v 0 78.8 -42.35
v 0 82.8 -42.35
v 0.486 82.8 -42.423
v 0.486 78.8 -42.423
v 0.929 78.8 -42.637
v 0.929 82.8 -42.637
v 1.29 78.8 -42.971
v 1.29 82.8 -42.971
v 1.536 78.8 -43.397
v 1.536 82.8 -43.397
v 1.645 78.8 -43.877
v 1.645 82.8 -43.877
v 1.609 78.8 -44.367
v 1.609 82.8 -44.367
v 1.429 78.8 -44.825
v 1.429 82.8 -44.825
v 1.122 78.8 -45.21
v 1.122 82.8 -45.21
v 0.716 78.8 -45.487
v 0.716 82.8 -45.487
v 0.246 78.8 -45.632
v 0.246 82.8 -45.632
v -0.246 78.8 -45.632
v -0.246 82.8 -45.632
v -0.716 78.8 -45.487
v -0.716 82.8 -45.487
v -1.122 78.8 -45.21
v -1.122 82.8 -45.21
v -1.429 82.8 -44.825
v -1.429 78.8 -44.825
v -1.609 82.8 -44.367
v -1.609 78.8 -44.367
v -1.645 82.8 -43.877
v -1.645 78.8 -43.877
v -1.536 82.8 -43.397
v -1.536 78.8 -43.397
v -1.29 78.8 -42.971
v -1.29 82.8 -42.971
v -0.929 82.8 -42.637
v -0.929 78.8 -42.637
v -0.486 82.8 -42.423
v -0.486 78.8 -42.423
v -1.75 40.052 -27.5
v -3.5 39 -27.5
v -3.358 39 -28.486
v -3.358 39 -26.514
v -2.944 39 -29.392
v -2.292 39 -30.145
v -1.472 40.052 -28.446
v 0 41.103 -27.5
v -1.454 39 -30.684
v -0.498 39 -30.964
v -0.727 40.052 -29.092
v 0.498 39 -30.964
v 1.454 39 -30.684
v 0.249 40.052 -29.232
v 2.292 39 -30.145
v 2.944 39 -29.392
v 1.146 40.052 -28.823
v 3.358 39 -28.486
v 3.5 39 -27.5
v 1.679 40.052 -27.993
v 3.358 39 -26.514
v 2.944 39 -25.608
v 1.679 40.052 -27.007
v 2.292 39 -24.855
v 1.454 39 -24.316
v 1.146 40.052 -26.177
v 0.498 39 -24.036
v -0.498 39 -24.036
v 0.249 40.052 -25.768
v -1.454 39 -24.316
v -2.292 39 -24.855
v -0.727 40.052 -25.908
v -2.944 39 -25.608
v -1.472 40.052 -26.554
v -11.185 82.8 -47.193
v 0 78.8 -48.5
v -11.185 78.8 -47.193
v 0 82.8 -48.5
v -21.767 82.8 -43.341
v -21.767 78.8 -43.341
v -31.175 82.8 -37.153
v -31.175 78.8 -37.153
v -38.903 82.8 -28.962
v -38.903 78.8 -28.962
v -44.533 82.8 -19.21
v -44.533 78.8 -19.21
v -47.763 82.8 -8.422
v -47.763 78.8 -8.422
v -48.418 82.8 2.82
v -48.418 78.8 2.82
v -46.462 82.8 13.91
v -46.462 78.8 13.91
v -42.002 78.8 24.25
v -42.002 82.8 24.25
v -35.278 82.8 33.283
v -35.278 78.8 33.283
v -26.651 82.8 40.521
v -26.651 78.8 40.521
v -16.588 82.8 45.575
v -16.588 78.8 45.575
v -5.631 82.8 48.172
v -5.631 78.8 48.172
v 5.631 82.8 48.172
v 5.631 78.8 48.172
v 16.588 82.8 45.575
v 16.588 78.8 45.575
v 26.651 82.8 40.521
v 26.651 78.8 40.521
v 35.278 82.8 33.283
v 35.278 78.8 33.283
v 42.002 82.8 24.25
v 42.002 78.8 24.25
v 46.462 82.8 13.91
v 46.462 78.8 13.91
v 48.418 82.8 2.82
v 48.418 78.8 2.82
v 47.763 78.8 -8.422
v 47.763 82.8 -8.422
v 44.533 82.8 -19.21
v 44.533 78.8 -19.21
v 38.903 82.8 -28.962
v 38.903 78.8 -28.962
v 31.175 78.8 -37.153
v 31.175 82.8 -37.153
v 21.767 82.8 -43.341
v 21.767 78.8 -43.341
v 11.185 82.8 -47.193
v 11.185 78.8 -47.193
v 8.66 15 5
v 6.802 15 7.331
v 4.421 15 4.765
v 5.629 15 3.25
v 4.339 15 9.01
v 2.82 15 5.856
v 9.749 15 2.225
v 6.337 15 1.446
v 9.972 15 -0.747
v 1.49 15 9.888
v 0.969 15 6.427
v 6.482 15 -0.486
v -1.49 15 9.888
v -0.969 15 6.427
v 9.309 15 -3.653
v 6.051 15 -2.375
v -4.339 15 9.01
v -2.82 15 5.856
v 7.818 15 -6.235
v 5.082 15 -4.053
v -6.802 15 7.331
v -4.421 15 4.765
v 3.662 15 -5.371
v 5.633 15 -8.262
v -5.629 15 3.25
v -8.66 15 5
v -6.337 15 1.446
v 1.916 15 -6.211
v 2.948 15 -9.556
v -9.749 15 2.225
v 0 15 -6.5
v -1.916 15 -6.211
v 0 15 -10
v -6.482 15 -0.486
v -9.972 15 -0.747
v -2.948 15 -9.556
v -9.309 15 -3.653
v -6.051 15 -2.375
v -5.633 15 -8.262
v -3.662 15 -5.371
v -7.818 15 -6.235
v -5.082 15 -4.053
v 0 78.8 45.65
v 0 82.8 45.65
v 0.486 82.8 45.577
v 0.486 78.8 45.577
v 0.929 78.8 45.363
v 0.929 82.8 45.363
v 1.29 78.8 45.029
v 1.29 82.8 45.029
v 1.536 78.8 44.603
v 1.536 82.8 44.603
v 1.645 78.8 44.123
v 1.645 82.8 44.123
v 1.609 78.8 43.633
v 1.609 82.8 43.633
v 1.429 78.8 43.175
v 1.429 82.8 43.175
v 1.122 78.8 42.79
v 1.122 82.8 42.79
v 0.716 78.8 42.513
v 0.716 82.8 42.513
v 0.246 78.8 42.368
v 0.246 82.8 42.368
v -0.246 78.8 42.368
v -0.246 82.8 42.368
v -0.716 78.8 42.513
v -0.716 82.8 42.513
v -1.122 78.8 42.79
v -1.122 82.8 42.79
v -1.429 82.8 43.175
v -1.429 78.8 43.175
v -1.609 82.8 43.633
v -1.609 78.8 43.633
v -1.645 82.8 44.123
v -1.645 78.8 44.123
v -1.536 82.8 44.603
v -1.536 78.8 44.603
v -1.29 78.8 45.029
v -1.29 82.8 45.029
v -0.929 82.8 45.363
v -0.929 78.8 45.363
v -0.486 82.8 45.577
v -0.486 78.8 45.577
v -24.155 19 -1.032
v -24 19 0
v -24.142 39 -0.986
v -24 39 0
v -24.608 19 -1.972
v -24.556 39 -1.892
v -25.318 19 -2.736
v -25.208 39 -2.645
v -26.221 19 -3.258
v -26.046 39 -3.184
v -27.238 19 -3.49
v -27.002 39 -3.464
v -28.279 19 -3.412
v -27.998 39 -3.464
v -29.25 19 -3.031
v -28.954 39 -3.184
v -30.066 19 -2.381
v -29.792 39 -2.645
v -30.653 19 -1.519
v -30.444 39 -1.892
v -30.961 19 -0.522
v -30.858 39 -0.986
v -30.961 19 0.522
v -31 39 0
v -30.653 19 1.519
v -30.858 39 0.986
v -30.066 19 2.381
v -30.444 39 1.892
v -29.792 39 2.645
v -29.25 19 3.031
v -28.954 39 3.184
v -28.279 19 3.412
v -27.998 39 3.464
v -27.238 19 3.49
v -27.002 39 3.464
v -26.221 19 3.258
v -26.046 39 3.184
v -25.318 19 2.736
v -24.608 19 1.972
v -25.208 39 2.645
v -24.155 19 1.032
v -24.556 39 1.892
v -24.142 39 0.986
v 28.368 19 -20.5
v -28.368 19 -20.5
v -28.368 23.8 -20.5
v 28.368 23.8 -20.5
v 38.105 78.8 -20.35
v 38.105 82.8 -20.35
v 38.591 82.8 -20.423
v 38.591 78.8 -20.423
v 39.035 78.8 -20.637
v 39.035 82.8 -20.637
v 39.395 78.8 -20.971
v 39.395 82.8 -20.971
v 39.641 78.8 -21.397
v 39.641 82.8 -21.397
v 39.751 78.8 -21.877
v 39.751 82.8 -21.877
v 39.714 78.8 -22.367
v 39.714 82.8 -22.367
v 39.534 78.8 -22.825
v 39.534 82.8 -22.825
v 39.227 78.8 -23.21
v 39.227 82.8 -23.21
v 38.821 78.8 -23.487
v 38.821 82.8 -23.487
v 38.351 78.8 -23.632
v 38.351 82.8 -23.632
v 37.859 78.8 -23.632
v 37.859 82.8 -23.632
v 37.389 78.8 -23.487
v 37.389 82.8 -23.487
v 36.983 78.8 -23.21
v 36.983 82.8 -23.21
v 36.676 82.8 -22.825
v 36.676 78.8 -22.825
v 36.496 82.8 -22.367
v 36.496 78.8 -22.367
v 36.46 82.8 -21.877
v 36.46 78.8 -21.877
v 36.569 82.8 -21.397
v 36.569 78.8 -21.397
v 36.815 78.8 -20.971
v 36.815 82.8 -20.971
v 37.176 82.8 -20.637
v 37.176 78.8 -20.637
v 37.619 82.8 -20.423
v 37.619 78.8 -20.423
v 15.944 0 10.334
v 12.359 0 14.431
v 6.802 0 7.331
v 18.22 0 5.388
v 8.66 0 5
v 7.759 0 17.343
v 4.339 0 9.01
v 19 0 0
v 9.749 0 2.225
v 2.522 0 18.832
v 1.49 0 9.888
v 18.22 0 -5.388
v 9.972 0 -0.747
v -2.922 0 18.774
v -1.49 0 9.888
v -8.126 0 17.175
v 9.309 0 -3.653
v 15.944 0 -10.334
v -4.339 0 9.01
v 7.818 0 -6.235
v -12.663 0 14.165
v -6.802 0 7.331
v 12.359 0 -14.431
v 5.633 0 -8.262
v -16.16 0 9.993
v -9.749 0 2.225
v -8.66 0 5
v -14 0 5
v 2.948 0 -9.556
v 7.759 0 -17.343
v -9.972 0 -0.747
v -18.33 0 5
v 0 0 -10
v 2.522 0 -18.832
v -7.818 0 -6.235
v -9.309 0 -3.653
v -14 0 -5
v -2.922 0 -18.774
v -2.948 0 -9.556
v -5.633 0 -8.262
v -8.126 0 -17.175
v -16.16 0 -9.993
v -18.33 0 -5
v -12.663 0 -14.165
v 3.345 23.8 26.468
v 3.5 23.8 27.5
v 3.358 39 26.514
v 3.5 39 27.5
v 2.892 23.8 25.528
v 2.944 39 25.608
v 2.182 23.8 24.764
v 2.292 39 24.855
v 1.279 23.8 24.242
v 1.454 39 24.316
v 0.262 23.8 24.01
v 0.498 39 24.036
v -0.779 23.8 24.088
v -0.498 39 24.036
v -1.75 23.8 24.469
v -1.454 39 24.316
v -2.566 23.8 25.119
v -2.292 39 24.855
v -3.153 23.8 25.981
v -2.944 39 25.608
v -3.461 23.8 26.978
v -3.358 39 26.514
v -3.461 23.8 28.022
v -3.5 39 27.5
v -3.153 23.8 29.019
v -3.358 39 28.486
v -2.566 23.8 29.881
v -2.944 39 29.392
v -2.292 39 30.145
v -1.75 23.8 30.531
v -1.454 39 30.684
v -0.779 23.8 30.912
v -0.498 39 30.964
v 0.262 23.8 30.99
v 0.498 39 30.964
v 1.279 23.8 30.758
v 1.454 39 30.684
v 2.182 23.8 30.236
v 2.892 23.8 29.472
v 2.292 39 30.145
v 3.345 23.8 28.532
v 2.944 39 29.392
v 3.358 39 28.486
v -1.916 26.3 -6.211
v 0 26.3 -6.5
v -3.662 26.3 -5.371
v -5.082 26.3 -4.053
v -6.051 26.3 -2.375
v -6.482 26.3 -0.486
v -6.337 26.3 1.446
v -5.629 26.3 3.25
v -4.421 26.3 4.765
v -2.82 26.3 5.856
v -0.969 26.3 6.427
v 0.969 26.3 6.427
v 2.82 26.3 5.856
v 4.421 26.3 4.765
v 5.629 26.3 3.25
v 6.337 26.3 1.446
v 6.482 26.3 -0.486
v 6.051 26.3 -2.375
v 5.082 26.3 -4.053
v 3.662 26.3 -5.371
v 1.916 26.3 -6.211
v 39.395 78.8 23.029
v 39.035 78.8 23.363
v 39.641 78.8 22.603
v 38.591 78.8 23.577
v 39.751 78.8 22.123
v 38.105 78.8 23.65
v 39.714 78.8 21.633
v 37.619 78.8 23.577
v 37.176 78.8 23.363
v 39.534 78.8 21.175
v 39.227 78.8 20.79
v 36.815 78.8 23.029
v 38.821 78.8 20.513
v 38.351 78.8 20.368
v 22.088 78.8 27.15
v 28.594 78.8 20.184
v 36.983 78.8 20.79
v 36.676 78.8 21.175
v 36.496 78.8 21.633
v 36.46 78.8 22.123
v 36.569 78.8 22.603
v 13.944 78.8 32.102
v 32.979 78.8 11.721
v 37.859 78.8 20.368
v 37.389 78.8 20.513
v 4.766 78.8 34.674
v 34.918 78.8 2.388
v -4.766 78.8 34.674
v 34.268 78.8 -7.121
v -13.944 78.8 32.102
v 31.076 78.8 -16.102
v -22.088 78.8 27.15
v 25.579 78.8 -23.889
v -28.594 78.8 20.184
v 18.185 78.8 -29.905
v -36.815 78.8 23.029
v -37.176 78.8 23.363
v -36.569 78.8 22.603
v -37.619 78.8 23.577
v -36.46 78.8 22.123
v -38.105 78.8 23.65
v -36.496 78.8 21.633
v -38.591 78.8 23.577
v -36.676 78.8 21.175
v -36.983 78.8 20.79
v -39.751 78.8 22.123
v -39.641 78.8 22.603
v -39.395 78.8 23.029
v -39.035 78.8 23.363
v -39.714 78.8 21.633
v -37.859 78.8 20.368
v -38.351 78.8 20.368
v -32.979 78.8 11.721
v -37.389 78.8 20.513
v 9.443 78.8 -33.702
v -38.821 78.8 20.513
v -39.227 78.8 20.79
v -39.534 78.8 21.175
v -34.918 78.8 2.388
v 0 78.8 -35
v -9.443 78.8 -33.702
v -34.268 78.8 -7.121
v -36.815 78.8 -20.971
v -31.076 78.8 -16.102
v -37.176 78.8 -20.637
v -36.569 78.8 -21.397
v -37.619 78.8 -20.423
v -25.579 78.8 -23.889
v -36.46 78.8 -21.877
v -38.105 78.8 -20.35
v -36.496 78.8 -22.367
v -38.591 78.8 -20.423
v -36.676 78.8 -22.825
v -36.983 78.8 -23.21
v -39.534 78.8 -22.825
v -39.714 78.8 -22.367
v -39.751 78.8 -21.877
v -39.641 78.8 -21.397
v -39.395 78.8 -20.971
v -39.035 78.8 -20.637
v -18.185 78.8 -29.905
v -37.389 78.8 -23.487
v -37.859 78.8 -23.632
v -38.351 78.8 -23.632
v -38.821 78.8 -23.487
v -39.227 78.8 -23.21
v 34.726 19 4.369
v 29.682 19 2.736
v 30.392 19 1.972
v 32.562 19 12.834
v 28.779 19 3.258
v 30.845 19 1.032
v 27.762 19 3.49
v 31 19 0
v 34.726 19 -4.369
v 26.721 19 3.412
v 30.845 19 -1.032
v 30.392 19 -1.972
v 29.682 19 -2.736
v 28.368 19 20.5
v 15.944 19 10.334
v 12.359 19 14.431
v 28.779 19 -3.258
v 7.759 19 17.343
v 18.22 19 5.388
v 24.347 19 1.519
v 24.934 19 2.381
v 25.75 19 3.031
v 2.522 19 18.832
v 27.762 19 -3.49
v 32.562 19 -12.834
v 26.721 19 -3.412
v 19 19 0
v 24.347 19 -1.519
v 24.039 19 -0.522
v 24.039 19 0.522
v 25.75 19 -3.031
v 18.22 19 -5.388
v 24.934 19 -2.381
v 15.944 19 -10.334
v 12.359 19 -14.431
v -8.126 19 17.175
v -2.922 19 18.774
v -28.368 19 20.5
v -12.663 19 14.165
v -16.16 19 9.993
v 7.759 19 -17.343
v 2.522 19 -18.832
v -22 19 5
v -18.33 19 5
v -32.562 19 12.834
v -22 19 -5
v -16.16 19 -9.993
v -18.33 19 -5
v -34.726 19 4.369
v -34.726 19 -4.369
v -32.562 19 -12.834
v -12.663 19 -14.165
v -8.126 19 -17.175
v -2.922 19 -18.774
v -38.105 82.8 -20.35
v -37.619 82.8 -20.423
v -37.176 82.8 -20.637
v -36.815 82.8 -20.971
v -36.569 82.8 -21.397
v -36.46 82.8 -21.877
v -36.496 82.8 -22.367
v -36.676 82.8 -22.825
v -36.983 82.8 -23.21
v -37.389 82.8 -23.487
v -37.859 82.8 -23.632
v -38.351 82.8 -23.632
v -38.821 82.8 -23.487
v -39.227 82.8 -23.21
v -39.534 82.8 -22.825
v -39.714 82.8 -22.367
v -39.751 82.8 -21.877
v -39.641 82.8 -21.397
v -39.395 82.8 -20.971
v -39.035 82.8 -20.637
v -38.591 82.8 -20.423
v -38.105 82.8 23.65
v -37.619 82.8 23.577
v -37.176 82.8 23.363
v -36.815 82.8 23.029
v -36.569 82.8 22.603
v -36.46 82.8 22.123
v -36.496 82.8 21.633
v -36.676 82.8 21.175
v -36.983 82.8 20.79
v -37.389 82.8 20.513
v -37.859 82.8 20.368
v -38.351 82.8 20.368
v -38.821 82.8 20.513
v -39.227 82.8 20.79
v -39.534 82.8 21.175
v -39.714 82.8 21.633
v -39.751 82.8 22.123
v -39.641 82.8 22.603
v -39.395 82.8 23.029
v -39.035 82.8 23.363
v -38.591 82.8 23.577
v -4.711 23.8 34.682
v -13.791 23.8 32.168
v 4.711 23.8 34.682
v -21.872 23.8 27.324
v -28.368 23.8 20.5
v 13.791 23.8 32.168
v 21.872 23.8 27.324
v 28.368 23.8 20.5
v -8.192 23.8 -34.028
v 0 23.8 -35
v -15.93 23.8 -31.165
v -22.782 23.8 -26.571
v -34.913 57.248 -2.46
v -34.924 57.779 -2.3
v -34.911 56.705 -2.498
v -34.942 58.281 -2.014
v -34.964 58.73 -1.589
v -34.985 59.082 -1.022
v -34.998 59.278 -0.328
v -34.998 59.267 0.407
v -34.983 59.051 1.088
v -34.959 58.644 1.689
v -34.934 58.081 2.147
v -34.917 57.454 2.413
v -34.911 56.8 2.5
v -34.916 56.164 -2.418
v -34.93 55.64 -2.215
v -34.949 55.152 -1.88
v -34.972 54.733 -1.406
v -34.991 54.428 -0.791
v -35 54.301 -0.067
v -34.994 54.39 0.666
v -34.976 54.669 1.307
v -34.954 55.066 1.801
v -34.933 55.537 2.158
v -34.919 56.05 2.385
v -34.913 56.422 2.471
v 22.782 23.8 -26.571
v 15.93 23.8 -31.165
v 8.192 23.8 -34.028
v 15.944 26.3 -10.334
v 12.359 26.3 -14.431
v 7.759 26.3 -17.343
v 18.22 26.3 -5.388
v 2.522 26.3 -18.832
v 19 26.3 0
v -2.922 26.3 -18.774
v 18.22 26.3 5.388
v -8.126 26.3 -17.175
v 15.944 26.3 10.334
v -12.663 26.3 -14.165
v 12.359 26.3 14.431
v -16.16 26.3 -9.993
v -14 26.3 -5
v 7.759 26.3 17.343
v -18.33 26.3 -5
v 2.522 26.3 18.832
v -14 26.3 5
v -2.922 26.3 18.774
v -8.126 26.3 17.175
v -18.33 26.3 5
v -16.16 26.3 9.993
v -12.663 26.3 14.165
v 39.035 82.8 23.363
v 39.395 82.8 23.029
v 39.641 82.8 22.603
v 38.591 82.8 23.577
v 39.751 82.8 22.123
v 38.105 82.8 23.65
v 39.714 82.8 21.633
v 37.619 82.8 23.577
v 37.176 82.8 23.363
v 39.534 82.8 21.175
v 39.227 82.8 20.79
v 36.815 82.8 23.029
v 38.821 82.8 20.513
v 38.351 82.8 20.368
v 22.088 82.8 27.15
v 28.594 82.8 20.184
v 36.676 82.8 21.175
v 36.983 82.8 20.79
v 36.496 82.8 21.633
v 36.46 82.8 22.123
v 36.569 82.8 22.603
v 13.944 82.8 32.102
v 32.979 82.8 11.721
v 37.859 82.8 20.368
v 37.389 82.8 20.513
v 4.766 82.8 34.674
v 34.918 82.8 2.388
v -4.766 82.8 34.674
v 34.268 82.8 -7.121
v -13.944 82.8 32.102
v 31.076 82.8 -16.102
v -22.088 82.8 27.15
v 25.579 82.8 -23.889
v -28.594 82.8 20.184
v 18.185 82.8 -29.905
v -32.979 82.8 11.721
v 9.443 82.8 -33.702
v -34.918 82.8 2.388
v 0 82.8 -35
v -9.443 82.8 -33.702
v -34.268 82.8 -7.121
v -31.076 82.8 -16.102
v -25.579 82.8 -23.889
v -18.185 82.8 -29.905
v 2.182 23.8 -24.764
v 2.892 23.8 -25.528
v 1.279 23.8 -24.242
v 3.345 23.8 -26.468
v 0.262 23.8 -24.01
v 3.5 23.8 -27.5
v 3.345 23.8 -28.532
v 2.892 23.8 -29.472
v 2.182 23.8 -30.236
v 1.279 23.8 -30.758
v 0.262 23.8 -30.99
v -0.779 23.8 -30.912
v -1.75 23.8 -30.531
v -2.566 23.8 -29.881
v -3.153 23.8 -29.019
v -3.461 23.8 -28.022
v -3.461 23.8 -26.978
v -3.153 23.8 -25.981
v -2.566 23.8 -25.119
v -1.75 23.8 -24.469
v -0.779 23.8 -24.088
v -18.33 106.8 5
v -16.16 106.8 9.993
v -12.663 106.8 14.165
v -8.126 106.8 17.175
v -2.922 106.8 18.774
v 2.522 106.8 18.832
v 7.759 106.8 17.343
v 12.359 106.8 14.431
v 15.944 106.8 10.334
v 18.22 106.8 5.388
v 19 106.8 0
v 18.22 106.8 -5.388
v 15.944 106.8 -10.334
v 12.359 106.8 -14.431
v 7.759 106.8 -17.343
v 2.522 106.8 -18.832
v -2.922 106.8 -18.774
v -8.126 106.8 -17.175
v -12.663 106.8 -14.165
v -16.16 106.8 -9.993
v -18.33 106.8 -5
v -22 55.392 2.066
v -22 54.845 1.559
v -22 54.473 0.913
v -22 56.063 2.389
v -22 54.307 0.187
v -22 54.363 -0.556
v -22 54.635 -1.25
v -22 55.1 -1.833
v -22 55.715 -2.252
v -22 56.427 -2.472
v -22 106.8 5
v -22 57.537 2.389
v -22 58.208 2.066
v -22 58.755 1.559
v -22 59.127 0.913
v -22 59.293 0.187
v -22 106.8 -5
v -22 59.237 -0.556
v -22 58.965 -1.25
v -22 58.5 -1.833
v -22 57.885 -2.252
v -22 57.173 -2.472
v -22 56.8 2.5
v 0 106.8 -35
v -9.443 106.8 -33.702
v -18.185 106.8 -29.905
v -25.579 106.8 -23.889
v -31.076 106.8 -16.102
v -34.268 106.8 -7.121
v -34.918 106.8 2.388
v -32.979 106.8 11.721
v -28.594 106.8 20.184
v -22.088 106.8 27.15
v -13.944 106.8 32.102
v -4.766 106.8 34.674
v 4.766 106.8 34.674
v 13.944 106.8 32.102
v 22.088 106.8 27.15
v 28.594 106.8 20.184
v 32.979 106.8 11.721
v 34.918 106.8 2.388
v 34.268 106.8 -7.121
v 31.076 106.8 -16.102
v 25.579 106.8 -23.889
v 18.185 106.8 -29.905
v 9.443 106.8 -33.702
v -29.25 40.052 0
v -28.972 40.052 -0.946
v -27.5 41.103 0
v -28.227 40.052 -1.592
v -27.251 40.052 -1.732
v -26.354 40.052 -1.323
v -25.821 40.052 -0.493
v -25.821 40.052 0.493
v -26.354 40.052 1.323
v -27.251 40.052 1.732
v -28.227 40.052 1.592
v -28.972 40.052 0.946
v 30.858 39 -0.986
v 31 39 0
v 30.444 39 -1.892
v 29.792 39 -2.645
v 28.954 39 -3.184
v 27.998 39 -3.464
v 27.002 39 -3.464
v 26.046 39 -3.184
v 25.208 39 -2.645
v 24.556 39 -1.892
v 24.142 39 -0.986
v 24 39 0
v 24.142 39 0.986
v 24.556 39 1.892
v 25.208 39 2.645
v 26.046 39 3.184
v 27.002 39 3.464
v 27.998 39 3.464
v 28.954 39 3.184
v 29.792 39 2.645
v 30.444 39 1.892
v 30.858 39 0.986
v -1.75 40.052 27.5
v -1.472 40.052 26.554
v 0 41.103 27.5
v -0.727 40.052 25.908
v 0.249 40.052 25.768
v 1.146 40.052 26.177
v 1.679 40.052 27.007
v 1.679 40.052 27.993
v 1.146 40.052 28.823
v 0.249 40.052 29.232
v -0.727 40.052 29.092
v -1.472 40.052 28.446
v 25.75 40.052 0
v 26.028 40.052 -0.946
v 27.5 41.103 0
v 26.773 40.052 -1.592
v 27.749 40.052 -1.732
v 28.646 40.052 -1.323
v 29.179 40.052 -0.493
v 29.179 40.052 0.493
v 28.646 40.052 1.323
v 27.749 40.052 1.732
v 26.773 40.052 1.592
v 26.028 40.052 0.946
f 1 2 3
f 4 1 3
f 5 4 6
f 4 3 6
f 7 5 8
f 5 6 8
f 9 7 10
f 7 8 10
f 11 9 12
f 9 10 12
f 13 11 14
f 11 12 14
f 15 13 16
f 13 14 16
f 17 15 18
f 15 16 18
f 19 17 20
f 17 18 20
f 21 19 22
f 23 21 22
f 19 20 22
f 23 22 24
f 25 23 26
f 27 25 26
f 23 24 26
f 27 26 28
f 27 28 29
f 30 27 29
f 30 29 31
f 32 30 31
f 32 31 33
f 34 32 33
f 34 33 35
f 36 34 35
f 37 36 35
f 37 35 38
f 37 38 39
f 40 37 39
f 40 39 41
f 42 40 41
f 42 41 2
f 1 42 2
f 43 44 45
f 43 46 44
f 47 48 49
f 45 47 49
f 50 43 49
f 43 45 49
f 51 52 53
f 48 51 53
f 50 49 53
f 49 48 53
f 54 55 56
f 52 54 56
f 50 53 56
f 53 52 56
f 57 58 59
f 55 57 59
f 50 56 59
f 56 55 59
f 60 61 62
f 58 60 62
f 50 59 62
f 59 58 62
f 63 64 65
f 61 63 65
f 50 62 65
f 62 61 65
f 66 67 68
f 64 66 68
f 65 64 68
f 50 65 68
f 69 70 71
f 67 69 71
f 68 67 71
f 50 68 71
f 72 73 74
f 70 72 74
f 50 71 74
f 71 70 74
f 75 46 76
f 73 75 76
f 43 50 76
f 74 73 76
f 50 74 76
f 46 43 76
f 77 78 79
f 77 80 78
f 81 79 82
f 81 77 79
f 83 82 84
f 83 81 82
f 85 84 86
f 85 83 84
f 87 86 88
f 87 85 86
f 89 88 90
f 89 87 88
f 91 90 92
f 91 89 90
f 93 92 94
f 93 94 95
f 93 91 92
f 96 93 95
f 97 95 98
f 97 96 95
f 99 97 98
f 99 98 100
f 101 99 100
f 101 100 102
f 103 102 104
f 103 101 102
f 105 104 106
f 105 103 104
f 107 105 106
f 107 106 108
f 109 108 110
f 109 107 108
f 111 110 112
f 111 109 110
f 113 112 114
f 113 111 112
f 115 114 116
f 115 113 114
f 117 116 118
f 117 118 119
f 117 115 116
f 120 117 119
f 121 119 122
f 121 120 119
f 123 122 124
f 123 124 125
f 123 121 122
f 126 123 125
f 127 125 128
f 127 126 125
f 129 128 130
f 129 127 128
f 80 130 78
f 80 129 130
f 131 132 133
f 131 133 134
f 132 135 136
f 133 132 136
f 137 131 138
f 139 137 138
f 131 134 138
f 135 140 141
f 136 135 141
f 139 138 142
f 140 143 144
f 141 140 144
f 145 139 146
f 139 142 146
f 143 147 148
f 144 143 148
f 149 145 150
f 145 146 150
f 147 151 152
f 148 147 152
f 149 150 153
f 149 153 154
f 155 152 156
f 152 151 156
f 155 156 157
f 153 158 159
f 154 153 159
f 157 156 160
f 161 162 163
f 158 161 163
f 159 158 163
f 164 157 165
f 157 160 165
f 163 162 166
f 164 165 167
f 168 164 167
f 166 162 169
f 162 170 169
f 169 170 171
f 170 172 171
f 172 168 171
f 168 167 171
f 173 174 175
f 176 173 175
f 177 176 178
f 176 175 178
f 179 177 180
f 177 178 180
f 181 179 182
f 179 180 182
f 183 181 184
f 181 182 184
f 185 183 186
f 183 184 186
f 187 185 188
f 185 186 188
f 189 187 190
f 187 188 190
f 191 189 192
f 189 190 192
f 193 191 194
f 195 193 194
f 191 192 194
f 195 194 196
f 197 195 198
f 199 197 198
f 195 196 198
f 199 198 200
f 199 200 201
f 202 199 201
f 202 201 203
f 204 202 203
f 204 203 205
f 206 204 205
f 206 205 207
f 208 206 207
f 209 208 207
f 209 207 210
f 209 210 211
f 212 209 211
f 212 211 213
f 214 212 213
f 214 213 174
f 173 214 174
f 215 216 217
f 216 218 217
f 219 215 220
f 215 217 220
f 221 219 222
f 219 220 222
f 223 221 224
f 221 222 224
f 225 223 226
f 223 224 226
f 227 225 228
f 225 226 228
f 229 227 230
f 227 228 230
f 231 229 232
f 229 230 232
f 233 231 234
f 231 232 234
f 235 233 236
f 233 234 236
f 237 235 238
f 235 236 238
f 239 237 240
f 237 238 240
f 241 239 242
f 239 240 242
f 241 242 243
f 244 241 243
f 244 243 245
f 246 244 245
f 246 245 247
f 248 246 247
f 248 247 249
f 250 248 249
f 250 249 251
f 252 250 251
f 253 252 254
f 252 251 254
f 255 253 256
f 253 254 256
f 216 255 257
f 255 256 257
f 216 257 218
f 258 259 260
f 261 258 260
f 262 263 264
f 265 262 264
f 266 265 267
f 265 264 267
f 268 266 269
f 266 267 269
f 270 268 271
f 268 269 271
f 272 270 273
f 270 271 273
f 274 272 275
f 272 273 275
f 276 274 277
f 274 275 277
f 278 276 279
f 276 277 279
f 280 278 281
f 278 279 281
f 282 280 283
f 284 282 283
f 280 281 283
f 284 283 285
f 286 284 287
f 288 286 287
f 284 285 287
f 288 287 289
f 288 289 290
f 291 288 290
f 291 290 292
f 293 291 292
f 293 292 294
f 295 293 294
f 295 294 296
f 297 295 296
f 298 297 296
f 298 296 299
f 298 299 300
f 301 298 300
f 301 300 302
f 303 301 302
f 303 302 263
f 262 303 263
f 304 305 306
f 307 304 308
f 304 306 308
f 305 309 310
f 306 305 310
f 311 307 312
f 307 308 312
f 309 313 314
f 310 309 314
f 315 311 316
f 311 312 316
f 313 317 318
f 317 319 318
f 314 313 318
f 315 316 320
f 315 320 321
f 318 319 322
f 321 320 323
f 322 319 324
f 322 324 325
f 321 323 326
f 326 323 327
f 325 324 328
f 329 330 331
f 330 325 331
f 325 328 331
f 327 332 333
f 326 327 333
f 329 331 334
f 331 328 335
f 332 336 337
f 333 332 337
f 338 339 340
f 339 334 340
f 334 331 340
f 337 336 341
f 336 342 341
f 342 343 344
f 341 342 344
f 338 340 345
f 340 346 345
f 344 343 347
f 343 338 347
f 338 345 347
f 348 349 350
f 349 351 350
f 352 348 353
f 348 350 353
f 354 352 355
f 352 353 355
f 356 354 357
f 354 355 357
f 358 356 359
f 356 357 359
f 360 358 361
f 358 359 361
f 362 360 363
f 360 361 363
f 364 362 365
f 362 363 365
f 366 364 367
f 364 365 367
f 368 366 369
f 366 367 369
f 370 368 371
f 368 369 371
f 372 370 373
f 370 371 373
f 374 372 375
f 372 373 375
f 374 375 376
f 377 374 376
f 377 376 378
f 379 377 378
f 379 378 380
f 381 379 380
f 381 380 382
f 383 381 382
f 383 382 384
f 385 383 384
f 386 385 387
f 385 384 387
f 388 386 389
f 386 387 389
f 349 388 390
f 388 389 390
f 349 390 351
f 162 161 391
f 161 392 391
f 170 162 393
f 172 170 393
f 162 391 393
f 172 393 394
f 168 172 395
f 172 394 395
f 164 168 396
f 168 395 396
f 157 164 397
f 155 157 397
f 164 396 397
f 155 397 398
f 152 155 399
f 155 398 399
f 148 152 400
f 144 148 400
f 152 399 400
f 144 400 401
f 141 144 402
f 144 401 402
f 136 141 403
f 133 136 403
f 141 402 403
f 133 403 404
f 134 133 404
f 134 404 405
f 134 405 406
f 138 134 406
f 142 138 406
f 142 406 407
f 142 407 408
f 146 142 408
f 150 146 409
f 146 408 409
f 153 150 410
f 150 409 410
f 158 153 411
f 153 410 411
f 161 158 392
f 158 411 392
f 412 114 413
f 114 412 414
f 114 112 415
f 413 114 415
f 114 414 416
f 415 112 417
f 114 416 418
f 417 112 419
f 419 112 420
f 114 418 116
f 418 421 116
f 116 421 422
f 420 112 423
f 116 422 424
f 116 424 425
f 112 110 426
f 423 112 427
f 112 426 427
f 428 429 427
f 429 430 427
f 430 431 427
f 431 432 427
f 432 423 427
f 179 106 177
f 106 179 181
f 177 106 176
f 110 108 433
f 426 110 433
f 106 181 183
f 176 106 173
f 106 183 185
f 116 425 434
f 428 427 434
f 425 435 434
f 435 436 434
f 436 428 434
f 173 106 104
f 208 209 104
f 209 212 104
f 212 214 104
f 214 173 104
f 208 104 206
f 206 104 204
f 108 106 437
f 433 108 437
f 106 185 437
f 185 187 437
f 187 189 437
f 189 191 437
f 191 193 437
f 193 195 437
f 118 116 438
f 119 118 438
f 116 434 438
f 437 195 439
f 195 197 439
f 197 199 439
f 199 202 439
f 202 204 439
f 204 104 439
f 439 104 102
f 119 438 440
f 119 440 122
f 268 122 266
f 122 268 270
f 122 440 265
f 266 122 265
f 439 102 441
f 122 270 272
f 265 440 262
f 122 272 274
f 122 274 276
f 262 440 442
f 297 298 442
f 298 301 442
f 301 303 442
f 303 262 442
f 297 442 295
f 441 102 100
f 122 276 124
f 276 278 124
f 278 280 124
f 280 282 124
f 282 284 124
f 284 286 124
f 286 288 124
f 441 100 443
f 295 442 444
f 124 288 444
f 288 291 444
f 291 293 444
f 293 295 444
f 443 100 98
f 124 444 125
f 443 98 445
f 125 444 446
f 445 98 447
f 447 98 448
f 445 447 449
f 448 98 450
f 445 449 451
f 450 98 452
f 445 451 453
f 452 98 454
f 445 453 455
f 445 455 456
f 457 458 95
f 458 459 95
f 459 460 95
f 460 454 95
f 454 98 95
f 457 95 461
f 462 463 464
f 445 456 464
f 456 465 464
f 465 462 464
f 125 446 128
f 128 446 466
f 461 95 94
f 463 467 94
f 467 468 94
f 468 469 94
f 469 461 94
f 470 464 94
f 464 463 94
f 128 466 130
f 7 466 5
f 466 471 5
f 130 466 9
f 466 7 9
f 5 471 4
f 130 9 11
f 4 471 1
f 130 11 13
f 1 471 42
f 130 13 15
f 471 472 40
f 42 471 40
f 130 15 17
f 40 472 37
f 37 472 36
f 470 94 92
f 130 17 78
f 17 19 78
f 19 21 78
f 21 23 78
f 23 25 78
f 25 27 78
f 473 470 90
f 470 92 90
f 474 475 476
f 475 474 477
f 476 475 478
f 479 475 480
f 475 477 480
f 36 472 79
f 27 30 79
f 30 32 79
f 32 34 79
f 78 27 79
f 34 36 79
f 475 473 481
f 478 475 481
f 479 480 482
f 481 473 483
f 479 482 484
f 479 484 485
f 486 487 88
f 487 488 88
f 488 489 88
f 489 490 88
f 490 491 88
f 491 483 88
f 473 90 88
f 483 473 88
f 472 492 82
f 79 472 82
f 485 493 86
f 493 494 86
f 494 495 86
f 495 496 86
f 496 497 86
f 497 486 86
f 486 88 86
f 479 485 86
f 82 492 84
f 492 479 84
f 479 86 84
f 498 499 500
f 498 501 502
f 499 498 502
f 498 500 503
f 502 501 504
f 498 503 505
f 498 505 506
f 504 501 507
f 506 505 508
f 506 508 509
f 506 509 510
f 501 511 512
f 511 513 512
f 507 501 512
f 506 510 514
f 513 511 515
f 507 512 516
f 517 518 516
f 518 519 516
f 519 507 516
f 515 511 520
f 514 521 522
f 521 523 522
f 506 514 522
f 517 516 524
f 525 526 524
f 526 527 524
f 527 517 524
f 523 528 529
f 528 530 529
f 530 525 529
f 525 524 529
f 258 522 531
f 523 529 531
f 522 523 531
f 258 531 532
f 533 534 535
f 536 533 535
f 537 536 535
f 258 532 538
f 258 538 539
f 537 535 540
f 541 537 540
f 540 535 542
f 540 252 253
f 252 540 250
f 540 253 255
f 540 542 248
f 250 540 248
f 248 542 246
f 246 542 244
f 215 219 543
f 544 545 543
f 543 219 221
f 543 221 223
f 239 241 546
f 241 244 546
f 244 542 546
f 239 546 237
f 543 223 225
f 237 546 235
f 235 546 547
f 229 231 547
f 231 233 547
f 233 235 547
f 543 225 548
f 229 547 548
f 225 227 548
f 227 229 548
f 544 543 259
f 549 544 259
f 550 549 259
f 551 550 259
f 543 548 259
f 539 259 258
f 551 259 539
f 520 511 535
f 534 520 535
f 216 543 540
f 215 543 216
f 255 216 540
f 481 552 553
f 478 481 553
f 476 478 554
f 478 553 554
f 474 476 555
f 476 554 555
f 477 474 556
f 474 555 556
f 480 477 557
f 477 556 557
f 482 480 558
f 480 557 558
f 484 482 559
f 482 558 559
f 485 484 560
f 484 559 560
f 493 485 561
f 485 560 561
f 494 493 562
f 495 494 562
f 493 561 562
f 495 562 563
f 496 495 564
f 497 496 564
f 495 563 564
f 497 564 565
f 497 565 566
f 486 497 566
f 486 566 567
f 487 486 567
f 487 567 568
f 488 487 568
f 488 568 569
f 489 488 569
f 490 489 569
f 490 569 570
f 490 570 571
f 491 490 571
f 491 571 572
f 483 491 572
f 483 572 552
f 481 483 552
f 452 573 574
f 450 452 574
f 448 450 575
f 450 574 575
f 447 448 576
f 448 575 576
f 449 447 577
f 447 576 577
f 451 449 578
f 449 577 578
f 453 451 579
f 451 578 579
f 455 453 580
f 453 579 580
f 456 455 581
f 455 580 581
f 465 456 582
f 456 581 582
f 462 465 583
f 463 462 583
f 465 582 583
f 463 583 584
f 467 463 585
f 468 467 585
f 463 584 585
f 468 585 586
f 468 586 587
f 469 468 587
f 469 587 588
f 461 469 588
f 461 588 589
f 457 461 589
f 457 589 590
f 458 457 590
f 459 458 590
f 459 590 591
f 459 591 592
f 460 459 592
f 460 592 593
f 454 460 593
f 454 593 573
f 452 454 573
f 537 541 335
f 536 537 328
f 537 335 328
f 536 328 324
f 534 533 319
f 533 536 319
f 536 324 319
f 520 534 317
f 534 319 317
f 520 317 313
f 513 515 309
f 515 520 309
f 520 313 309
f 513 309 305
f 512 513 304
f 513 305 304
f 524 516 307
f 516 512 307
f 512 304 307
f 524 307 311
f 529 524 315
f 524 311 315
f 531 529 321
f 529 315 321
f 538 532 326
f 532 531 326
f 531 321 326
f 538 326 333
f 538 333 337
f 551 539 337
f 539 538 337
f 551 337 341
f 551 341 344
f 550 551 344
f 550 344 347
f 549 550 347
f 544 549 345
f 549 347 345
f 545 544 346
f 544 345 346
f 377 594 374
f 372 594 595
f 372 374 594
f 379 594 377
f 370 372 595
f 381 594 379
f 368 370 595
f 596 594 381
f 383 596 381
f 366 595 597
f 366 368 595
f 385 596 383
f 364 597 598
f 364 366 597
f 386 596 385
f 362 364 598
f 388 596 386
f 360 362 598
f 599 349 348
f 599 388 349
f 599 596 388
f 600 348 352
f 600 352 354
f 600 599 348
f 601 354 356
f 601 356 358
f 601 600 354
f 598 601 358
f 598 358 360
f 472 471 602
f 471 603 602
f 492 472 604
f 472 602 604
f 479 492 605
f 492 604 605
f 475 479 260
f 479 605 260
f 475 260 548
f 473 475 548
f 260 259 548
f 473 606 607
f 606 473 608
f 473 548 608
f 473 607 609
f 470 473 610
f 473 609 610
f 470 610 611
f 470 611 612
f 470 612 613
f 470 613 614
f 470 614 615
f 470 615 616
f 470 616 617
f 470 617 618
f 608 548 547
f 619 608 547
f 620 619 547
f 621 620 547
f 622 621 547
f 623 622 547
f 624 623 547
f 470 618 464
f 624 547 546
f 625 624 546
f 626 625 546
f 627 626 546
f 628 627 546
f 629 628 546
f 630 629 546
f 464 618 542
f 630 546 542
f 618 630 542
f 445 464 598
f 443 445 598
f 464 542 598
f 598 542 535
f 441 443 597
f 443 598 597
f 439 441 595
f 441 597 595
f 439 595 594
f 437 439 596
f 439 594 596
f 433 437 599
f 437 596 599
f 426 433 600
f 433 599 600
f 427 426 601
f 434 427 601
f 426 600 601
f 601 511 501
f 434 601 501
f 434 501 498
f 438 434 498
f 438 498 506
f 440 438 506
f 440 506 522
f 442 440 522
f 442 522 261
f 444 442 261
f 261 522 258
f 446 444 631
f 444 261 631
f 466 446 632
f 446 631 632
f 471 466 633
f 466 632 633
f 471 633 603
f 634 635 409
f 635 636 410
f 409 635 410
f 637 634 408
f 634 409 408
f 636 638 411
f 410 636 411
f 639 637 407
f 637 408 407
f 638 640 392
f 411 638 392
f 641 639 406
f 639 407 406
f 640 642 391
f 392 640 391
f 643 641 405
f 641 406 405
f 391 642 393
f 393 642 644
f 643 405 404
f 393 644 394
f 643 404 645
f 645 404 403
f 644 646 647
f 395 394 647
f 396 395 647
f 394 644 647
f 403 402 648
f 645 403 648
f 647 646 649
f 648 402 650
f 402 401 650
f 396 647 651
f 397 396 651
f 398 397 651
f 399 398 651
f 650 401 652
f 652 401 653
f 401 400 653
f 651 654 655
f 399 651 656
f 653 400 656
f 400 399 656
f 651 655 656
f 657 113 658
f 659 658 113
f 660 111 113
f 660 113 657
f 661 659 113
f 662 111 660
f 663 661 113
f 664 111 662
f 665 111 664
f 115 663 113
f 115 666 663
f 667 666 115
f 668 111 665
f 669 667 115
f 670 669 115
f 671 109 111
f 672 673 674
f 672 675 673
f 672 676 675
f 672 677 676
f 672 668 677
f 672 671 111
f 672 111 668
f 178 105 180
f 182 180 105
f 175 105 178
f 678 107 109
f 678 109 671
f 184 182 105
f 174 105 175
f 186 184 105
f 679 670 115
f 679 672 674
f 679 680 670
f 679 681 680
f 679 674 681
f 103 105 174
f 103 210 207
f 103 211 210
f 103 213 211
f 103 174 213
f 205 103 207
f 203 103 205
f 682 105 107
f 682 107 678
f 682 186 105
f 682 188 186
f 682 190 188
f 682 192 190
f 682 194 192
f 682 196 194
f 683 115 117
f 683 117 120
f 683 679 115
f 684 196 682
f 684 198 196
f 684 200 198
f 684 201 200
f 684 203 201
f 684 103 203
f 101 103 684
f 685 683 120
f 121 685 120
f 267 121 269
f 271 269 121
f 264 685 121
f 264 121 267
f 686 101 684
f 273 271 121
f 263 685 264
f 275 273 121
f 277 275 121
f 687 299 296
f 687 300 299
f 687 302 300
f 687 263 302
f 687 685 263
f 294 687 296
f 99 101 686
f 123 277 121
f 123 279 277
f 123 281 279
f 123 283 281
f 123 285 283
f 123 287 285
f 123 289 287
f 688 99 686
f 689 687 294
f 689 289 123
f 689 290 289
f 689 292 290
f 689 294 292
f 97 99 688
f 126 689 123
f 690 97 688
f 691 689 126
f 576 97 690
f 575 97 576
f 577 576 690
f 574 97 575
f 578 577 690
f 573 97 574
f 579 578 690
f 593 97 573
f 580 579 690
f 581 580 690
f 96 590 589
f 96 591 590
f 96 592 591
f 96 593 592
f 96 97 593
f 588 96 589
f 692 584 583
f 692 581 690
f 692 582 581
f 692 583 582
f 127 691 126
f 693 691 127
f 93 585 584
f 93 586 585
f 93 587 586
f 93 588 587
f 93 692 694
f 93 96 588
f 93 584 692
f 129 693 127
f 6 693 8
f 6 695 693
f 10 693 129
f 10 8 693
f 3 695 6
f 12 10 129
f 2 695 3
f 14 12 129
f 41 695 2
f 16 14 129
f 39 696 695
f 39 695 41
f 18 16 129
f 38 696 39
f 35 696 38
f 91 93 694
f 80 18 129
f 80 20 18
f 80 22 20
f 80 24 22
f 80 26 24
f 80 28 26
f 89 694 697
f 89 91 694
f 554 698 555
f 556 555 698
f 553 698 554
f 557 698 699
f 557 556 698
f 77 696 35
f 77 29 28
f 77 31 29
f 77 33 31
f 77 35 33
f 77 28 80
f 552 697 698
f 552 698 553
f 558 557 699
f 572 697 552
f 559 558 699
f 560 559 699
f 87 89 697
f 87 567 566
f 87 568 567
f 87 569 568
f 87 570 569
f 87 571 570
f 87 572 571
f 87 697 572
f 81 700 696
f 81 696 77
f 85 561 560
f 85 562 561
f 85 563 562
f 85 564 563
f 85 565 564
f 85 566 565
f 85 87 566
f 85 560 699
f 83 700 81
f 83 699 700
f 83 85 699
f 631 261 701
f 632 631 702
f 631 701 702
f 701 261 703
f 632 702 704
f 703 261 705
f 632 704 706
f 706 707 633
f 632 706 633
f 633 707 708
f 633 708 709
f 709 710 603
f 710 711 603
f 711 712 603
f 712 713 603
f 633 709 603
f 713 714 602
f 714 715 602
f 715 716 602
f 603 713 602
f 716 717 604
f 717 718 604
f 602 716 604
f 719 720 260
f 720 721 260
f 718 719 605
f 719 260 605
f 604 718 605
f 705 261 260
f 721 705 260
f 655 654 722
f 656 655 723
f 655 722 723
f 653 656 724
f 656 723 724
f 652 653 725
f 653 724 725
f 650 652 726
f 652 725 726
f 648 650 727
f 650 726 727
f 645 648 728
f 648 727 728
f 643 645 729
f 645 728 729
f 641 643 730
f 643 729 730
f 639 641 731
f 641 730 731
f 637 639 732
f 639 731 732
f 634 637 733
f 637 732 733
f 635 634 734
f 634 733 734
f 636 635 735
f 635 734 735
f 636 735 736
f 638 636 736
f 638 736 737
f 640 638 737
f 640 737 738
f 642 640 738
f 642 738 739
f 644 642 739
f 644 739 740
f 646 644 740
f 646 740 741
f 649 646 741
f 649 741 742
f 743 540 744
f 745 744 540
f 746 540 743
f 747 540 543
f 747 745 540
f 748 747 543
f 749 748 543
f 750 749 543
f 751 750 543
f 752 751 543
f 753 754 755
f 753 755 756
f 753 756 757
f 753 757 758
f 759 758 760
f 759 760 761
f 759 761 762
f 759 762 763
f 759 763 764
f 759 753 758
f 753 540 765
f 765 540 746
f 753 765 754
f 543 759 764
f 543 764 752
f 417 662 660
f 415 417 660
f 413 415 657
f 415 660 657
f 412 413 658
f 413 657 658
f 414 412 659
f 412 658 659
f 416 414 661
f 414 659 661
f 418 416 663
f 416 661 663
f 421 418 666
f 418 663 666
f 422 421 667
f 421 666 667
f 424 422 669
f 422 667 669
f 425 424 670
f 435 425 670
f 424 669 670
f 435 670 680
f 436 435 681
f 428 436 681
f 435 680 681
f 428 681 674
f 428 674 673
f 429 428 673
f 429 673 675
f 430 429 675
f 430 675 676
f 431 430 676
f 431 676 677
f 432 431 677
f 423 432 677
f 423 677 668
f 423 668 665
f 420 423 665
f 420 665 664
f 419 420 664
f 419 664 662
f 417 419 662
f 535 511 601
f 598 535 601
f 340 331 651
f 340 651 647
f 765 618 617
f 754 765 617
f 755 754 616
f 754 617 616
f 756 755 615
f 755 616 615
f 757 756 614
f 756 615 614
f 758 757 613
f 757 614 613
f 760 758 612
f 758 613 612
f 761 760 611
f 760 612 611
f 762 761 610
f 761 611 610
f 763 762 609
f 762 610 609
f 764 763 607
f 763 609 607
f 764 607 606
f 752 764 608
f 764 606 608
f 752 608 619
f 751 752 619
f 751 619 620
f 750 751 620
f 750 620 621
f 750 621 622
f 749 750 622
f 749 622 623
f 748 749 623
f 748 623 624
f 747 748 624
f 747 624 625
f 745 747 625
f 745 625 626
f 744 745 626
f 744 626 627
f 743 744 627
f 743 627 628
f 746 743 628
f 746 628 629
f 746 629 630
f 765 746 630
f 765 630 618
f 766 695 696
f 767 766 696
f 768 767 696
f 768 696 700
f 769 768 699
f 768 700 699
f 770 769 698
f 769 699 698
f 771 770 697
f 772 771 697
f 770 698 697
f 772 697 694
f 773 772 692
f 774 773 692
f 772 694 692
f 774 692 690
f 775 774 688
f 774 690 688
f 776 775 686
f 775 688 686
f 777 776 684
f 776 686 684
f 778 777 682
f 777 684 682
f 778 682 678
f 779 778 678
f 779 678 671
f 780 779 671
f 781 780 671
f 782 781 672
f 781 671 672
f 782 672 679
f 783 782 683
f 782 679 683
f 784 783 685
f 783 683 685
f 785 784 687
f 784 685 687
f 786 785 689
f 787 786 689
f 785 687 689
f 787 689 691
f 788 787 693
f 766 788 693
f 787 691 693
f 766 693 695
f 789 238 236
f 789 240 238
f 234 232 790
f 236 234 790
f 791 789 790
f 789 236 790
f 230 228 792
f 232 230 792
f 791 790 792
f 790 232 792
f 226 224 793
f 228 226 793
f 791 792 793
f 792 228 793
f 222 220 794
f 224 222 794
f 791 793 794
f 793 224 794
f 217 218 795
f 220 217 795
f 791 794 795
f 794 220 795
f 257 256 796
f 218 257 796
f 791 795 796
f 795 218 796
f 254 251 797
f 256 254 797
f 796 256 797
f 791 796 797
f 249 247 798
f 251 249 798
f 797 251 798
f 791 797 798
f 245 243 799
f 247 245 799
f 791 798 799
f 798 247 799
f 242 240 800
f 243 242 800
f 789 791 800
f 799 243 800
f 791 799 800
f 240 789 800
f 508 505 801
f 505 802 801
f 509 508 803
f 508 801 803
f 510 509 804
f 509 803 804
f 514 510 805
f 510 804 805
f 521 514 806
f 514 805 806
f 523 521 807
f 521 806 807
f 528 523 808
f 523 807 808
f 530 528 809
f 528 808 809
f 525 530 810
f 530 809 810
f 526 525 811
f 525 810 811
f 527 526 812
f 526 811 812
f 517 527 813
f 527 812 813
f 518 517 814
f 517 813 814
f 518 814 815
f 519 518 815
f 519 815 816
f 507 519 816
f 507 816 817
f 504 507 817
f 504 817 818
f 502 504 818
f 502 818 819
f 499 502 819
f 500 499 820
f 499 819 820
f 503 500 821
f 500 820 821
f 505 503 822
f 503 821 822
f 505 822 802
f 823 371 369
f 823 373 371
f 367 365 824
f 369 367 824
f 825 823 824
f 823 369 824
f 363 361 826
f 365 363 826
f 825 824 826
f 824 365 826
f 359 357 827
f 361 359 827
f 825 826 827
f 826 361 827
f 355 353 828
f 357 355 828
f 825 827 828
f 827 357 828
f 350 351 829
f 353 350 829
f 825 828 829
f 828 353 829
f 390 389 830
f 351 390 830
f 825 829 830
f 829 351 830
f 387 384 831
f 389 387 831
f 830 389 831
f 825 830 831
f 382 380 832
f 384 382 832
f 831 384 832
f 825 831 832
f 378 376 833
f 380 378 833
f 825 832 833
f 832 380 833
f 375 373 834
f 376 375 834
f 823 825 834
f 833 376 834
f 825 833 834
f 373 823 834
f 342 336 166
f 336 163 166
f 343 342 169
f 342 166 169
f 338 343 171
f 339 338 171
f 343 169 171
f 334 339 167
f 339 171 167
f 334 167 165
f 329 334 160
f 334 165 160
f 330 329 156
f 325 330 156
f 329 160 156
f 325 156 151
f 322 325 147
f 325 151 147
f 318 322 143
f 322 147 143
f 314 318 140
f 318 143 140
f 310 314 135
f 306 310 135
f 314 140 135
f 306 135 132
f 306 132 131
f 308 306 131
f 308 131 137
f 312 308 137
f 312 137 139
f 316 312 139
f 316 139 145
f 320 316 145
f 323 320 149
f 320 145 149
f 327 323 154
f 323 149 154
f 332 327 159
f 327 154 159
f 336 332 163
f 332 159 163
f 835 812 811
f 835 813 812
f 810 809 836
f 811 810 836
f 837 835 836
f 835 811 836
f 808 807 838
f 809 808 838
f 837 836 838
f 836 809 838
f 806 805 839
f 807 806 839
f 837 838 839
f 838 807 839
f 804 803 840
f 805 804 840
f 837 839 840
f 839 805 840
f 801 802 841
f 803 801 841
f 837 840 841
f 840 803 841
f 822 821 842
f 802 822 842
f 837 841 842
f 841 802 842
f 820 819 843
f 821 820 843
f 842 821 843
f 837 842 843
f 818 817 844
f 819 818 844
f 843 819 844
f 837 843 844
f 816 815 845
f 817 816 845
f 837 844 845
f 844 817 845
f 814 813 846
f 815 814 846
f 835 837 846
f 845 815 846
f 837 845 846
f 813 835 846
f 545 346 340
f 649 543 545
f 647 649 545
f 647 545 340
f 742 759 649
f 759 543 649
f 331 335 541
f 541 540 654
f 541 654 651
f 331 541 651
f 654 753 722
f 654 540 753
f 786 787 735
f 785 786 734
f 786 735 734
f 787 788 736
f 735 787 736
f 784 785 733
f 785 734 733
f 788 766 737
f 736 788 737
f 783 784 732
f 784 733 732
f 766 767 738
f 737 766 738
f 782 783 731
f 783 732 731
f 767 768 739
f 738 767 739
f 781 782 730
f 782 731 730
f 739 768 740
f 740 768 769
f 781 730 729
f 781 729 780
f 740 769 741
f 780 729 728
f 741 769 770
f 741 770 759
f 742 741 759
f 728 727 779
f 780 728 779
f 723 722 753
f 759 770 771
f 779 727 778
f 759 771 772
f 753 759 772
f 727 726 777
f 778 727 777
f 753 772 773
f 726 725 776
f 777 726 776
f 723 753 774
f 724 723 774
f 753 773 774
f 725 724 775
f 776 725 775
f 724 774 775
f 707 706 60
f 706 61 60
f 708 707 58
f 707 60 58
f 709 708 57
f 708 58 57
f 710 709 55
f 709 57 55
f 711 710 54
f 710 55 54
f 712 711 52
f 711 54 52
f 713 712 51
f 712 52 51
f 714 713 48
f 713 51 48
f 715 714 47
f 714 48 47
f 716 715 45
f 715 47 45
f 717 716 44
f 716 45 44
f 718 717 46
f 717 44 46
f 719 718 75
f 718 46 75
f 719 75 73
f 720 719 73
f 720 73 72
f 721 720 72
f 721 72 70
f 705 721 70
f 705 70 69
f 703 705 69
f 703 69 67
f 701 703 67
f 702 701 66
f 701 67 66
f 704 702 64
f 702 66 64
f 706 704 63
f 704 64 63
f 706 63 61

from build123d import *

# Parameters (mm, degrees)
EXTRUDE1_REACH            = 119.713
SKETCH2_W                 = 8
SKETCH2_H                 = 10
SKETCH3_W                 = 13.5
SKETCH3_H                 = 4
SKETCH5_W                 = 15.5
SKETCH5_H                 = 4.8
EXTRUDE3_DEPTH            = 40
SKETCH6_R                 = 1.65
EXTRUDE4_DEPTH            = 10
M8X1_0_TAPPED_HOLE1_D     = 7
M8X1_0_TAPPED_HOLE1_DEPTH = 20
M8X1_0_TAPPED_HOLE1_TIP   = 2.103012167
M6X1_0_TAPPED_HOLE1_D     = 5
M6X1_0_TAPPED_HOLE1_DEPTH = 26.5


with BuildPart() as part:
    # Sketch1 → Revolve1 (revolve)
    with BuildSketch(Plane.XY, mode=Mode.PRIVATE) as revolve1_sk:
        Polygon((-6.5, 26.3), (-19, 26.3), (-19, 106.8), (-35, 106.8), (-35, 19), (-19, 19), (-19, 0), (-10, 0), (-10, 15), (-6.5, 15), align=None)
    revolve(revolve1_sk.sketch.rotate(Axis((0, 0, 0), (0, 1, 0)), 270), axis=Axis((0, 0, 0), (0, 1, 0)))

    # Sketch2 → Extrude1 (cut, up to next)
    with BuildSketch(Plane(origin=(0, 106.8, 0), x_dir=(1, 0, 0), z_dir=(0, 1, 0)), mode=Mode.PRIVATE) as extrude1_sk1:
        with Locations((-18, 0)):
            Rectangle(SKETCH2_W, SKETCH2_H)
    extrude1_tool1 = extrude(extrude1_sk1.sketch, amount=-EXTRUDE1_REACH, mode=Mode.PRIVATE) & part.part
    add(extrude1_tool1.solids().sort_by_distance((-18, 106.8, 0))[0], mode=Mode.SUBTRACT)

    # Sketch3 → Revolve2 (revolve)
    with BuildSketch(Plane.XY, mode=Mode.PRIVATE) as revolve2_sk:
        with Locations((-41.75, 80.8)):
            Rectangle(SKETCH3_W, SKETCH3_H)
    revolve(revolve2_sk.sketch.rotate(Axis((0, 0, 0), (0, 1, 0)), 270), axis=Axis((0, 0, 0), (0, 1, 0)))

    # Sketch5 → Extrude3 (cut, symmetric)
    with BuildSketch(Plane(origin=(0, 0, 0), x_dir=(0, 0, -1), z_dir=(1, 0, 0))):
        with Locations((28.25, 21.4)):
            Rectangle(SKETCH5_W, SKETCH5_H)
        with Locations((-28.25, 21.4)):
            Rectangle(SKETCH5_W, SKETCH5_H)
    extrude(amount=EXTRUDE3_DEPTH, both=True, mode=Mode.SUBTRACT)

    # Sketch6 → Extrude4 (cut)
    with BuildSketch(Plane(origin=(0, 82.8, 0), x_dir=(1, 0, 0), z_dir=(0, 1, 0))):
        with Locations(Location((0, -44, 0), (0, 0, 270))):
            Circle(SKETCH6_R)
        with Locations(Location((-38.105117767, -22, 0), (0, 0, 270))):
            Circle(SKETCH6_R)
        with Locations(Location((-38.105117767, 22, 0), (0, 0, 270))):
            Circle(SKETCH6_R)
        with Locations(Location((0, 44, 0), (0, 0, 270))):
            Circle(SKETCH6_R)
        with Locations(Location((38.105117767, 22, 0), (0, 0, 270))):
            Circle(SKETCH6_R)
        with Locations(Location((38.105117767, -22, 0), (0, 0, 270))):
            Circle(SKETCH6_R)
    extrude(amount=-EXTRUDE4_DEPTH, mode=Mode.SUBTRACT)

    # M8x1.0 Tapped Hole1
    with Locations(Plane(origin=(-35, 19, 0), x_dir=(-1, 0, 0), z_dir=(0, -1, 0))):
        with Locations((-62.5, 0), (-7.5, 0), (-35, 27.5), (-35, -27.5)):
            Hole(M8X1_0_TAPPED_HOLE1_D / 2, depth=M8X1_0_TAPPED_HOLE1_DEPTH)
            with Locations((0, 0, -(M8X1_0_TAPPED_HOLE1_DEPTH + M8X1_0_TAPPED_HOLE1_TIP / 2))):  # 118° drill point
                Cone(0, M8X1_0_TAPPED_HOLE1_D / 2, M8X1_0_TAPPED_HOLE1_TIP, mode=Mode.SUBTRACT)

    # M6x1.0 Tapped Hole1
    with Locations(Plane(origin=(-22, 0, 0), x_dir=(0, 0, -1), z_dir=(1, 0, 0))):
        with Locations((0, 56.8)):
            Hole(M6X1_0_TAPPED_HOLE1_D / 2, depth=M6X1_0_TAPPED_HOLE1_DEPTH)


solid = part.part
